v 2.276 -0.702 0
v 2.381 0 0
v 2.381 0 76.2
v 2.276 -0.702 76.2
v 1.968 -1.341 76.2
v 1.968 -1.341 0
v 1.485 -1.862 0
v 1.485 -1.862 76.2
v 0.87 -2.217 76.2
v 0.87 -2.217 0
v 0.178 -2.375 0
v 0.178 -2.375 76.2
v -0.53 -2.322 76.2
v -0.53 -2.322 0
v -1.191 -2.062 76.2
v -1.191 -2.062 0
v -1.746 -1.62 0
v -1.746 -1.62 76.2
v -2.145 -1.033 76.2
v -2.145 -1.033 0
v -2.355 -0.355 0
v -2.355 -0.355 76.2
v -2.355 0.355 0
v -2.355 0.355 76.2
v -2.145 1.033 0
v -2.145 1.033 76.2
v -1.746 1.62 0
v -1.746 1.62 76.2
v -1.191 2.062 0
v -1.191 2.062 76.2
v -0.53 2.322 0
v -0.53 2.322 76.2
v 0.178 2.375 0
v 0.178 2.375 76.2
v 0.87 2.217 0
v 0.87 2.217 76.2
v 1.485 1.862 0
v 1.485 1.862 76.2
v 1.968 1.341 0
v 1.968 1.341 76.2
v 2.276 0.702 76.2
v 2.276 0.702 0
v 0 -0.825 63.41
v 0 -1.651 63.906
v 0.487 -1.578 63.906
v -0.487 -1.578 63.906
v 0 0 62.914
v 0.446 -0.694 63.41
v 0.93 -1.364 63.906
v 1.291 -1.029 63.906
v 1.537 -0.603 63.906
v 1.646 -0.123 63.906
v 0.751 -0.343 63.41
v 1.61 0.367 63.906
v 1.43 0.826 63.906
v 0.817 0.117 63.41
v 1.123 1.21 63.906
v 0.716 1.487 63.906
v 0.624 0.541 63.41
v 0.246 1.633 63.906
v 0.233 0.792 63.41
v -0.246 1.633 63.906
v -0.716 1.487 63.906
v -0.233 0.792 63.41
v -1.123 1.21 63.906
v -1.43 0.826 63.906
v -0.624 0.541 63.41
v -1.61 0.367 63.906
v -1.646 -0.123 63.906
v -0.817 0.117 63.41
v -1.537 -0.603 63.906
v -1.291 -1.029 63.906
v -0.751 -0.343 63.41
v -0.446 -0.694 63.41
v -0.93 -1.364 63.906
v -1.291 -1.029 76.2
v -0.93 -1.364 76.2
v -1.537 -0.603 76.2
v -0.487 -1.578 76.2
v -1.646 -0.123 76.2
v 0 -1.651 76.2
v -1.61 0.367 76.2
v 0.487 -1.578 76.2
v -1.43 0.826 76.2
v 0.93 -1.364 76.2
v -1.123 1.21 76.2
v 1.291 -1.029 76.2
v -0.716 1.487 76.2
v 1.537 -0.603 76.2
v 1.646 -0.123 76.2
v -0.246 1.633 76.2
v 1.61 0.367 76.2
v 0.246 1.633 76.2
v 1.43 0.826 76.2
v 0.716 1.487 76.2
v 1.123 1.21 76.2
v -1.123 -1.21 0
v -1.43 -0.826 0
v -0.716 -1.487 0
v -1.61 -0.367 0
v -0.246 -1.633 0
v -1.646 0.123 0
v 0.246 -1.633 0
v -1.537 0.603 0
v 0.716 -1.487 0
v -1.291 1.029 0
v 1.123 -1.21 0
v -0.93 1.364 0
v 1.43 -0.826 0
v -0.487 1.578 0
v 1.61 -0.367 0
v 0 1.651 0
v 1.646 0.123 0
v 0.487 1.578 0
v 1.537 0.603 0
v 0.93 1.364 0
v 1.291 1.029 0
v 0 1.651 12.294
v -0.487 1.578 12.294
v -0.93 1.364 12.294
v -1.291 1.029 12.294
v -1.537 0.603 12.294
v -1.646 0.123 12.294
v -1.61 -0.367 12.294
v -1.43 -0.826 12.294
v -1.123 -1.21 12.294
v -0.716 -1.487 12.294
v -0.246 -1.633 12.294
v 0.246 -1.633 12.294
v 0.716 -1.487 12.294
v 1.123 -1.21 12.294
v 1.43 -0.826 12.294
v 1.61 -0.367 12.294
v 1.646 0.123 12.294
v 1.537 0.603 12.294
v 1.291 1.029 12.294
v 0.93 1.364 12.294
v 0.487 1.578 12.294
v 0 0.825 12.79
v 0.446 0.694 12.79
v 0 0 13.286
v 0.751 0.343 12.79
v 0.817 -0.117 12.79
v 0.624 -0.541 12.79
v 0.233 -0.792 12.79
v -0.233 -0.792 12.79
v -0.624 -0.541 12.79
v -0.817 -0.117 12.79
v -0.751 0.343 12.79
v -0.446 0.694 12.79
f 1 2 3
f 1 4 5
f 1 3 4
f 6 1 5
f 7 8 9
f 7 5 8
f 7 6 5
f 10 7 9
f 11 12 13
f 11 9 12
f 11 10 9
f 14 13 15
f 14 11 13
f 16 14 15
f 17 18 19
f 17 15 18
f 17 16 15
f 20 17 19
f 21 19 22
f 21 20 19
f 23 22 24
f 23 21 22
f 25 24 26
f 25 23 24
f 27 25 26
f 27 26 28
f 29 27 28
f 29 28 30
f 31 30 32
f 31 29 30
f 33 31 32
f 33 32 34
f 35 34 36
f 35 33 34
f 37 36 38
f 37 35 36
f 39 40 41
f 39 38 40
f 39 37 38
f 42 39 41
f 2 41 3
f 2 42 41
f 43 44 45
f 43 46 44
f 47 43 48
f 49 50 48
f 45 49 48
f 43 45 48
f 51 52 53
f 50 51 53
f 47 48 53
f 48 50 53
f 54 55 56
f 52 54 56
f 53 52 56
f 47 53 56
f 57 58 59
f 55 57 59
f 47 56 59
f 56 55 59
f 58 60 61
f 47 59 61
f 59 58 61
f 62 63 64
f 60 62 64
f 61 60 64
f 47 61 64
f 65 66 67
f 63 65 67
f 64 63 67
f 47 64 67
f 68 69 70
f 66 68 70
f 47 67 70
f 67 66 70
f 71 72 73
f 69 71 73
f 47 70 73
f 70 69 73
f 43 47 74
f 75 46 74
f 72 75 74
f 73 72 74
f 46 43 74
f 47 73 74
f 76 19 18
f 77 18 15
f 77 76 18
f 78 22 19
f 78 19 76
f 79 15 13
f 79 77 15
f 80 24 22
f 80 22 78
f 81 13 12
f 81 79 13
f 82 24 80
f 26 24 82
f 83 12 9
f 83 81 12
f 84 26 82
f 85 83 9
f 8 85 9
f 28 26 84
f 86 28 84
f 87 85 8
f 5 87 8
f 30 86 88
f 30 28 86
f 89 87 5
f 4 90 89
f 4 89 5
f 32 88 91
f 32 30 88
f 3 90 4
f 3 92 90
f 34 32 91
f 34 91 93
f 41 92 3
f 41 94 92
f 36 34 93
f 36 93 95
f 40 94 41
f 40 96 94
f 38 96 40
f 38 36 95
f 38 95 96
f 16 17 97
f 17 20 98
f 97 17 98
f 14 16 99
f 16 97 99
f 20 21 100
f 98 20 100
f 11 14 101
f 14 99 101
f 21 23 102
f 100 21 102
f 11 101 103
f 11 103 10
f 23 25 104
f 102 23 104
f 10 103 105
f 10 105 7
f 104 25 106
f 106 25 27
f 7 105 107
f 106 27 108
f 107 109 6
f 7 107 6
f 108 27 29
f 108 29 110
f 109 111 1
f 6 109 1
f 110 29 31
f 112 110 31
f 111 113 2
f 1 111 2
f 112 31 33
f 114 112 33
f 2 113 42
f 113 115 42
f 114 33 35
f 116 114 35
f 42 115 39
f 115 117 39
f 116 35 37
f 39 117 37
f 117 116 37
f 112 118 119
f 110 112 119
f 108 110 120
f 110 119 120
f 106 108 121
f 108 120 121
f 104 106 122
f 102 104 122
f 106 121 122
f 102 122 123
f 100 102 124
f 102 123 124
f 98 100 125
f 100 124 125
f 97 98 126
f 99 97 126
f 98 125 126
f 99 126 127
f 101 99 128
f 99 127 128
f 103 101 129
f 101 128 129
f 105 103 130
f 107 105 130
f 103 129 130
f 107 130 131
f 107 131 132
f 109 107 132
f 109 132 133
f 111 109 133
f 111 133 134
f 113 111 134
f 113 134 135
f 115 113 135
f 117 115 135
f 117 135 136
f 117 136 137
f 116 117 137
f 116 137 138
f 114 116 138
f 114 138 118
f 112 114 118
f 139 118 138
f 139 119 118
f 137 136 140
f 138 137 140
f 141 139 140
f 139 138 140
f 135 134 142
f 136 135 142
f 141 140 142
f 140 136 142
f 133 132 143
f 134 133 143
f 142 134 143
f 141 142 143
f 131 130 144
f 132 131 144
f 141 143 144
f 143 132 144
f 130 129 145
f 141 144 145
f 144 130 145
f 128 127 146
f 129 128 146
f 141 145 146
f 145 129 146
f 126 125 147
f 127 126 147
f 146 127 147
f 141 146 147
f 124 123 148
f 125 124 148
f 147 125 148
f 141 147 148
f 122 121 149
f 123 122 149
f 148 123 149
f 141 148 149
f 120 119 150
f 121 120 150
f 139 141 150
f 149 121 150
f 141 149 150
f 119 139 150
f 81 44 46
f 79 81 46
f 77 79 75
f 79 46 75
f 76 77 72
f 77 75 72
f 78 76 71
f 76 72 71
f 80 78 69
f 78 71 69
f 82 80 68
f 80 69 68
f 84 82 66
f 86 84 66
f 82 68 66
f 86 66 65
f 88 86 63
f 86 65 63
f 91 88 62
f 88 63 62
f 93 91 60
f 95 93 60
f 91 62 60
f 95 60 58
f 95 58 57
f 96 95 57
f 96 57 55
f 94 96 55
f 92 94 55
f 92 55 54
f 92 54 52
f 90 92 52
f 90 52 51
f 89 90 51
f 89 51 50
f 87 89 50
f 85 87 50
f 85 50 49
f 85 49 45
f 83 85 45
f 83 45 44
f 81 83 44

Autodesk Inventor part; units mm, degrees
ref_plane "YZ Plane" through (0, 0, 0) normal (1, 0, 0) x (0, 1, 0)
ref_plane "XZ Plane" through (0, 0, 0) normal (0, 1, 0) x (-1, 0, 0)
ref_plane "XY Plane" through (0, 0, 0) normal (0, 0, 1) x (1, 0, 0)
sketch "Sketch1" plane through (0, 0, 0) normal (0, 0, 1) x (1, 0, 0)
  circle A0 centre (0, 0) radius 2.3813
  dimension "d0" = 4.7625
extrude "Extrusion1" add sketch "Sketch1" along normal blind 76.2
sketch "Sketch2" plane through (0, 0, 76.2) normal (0, 0, 1) x (1, 0, 0)
  circle A0 centre (0, 0) radius 2.3813 projected
  circle A1 centre (0, 0) radius 1.1303
  dimension "d3" = 2.2606
hole "Hole1" at (0, 0, 76.2) direction (0, 0, -1) diameter 3.302 depth 12.2936 tip angle 118 thread size "8-32 UNC" class "2B" standard "ANSI Unified Screw Threads"
sketch "Sketch3" plane through (0, 0, 0) normal (0, 0, -1) x (-1, 0, 0)
  circle A0 centre (0, 0) radius 2.3813 projected
hole "Hole2" at (0, 0, 0) direction (0, 0, 1) diameter 3.302 depth 12.2936 tip angle 118 thread size "8-32 UNC" class "2B" standard "ANSI Unified Screw Threads"
properties part number "Steel Rod"
